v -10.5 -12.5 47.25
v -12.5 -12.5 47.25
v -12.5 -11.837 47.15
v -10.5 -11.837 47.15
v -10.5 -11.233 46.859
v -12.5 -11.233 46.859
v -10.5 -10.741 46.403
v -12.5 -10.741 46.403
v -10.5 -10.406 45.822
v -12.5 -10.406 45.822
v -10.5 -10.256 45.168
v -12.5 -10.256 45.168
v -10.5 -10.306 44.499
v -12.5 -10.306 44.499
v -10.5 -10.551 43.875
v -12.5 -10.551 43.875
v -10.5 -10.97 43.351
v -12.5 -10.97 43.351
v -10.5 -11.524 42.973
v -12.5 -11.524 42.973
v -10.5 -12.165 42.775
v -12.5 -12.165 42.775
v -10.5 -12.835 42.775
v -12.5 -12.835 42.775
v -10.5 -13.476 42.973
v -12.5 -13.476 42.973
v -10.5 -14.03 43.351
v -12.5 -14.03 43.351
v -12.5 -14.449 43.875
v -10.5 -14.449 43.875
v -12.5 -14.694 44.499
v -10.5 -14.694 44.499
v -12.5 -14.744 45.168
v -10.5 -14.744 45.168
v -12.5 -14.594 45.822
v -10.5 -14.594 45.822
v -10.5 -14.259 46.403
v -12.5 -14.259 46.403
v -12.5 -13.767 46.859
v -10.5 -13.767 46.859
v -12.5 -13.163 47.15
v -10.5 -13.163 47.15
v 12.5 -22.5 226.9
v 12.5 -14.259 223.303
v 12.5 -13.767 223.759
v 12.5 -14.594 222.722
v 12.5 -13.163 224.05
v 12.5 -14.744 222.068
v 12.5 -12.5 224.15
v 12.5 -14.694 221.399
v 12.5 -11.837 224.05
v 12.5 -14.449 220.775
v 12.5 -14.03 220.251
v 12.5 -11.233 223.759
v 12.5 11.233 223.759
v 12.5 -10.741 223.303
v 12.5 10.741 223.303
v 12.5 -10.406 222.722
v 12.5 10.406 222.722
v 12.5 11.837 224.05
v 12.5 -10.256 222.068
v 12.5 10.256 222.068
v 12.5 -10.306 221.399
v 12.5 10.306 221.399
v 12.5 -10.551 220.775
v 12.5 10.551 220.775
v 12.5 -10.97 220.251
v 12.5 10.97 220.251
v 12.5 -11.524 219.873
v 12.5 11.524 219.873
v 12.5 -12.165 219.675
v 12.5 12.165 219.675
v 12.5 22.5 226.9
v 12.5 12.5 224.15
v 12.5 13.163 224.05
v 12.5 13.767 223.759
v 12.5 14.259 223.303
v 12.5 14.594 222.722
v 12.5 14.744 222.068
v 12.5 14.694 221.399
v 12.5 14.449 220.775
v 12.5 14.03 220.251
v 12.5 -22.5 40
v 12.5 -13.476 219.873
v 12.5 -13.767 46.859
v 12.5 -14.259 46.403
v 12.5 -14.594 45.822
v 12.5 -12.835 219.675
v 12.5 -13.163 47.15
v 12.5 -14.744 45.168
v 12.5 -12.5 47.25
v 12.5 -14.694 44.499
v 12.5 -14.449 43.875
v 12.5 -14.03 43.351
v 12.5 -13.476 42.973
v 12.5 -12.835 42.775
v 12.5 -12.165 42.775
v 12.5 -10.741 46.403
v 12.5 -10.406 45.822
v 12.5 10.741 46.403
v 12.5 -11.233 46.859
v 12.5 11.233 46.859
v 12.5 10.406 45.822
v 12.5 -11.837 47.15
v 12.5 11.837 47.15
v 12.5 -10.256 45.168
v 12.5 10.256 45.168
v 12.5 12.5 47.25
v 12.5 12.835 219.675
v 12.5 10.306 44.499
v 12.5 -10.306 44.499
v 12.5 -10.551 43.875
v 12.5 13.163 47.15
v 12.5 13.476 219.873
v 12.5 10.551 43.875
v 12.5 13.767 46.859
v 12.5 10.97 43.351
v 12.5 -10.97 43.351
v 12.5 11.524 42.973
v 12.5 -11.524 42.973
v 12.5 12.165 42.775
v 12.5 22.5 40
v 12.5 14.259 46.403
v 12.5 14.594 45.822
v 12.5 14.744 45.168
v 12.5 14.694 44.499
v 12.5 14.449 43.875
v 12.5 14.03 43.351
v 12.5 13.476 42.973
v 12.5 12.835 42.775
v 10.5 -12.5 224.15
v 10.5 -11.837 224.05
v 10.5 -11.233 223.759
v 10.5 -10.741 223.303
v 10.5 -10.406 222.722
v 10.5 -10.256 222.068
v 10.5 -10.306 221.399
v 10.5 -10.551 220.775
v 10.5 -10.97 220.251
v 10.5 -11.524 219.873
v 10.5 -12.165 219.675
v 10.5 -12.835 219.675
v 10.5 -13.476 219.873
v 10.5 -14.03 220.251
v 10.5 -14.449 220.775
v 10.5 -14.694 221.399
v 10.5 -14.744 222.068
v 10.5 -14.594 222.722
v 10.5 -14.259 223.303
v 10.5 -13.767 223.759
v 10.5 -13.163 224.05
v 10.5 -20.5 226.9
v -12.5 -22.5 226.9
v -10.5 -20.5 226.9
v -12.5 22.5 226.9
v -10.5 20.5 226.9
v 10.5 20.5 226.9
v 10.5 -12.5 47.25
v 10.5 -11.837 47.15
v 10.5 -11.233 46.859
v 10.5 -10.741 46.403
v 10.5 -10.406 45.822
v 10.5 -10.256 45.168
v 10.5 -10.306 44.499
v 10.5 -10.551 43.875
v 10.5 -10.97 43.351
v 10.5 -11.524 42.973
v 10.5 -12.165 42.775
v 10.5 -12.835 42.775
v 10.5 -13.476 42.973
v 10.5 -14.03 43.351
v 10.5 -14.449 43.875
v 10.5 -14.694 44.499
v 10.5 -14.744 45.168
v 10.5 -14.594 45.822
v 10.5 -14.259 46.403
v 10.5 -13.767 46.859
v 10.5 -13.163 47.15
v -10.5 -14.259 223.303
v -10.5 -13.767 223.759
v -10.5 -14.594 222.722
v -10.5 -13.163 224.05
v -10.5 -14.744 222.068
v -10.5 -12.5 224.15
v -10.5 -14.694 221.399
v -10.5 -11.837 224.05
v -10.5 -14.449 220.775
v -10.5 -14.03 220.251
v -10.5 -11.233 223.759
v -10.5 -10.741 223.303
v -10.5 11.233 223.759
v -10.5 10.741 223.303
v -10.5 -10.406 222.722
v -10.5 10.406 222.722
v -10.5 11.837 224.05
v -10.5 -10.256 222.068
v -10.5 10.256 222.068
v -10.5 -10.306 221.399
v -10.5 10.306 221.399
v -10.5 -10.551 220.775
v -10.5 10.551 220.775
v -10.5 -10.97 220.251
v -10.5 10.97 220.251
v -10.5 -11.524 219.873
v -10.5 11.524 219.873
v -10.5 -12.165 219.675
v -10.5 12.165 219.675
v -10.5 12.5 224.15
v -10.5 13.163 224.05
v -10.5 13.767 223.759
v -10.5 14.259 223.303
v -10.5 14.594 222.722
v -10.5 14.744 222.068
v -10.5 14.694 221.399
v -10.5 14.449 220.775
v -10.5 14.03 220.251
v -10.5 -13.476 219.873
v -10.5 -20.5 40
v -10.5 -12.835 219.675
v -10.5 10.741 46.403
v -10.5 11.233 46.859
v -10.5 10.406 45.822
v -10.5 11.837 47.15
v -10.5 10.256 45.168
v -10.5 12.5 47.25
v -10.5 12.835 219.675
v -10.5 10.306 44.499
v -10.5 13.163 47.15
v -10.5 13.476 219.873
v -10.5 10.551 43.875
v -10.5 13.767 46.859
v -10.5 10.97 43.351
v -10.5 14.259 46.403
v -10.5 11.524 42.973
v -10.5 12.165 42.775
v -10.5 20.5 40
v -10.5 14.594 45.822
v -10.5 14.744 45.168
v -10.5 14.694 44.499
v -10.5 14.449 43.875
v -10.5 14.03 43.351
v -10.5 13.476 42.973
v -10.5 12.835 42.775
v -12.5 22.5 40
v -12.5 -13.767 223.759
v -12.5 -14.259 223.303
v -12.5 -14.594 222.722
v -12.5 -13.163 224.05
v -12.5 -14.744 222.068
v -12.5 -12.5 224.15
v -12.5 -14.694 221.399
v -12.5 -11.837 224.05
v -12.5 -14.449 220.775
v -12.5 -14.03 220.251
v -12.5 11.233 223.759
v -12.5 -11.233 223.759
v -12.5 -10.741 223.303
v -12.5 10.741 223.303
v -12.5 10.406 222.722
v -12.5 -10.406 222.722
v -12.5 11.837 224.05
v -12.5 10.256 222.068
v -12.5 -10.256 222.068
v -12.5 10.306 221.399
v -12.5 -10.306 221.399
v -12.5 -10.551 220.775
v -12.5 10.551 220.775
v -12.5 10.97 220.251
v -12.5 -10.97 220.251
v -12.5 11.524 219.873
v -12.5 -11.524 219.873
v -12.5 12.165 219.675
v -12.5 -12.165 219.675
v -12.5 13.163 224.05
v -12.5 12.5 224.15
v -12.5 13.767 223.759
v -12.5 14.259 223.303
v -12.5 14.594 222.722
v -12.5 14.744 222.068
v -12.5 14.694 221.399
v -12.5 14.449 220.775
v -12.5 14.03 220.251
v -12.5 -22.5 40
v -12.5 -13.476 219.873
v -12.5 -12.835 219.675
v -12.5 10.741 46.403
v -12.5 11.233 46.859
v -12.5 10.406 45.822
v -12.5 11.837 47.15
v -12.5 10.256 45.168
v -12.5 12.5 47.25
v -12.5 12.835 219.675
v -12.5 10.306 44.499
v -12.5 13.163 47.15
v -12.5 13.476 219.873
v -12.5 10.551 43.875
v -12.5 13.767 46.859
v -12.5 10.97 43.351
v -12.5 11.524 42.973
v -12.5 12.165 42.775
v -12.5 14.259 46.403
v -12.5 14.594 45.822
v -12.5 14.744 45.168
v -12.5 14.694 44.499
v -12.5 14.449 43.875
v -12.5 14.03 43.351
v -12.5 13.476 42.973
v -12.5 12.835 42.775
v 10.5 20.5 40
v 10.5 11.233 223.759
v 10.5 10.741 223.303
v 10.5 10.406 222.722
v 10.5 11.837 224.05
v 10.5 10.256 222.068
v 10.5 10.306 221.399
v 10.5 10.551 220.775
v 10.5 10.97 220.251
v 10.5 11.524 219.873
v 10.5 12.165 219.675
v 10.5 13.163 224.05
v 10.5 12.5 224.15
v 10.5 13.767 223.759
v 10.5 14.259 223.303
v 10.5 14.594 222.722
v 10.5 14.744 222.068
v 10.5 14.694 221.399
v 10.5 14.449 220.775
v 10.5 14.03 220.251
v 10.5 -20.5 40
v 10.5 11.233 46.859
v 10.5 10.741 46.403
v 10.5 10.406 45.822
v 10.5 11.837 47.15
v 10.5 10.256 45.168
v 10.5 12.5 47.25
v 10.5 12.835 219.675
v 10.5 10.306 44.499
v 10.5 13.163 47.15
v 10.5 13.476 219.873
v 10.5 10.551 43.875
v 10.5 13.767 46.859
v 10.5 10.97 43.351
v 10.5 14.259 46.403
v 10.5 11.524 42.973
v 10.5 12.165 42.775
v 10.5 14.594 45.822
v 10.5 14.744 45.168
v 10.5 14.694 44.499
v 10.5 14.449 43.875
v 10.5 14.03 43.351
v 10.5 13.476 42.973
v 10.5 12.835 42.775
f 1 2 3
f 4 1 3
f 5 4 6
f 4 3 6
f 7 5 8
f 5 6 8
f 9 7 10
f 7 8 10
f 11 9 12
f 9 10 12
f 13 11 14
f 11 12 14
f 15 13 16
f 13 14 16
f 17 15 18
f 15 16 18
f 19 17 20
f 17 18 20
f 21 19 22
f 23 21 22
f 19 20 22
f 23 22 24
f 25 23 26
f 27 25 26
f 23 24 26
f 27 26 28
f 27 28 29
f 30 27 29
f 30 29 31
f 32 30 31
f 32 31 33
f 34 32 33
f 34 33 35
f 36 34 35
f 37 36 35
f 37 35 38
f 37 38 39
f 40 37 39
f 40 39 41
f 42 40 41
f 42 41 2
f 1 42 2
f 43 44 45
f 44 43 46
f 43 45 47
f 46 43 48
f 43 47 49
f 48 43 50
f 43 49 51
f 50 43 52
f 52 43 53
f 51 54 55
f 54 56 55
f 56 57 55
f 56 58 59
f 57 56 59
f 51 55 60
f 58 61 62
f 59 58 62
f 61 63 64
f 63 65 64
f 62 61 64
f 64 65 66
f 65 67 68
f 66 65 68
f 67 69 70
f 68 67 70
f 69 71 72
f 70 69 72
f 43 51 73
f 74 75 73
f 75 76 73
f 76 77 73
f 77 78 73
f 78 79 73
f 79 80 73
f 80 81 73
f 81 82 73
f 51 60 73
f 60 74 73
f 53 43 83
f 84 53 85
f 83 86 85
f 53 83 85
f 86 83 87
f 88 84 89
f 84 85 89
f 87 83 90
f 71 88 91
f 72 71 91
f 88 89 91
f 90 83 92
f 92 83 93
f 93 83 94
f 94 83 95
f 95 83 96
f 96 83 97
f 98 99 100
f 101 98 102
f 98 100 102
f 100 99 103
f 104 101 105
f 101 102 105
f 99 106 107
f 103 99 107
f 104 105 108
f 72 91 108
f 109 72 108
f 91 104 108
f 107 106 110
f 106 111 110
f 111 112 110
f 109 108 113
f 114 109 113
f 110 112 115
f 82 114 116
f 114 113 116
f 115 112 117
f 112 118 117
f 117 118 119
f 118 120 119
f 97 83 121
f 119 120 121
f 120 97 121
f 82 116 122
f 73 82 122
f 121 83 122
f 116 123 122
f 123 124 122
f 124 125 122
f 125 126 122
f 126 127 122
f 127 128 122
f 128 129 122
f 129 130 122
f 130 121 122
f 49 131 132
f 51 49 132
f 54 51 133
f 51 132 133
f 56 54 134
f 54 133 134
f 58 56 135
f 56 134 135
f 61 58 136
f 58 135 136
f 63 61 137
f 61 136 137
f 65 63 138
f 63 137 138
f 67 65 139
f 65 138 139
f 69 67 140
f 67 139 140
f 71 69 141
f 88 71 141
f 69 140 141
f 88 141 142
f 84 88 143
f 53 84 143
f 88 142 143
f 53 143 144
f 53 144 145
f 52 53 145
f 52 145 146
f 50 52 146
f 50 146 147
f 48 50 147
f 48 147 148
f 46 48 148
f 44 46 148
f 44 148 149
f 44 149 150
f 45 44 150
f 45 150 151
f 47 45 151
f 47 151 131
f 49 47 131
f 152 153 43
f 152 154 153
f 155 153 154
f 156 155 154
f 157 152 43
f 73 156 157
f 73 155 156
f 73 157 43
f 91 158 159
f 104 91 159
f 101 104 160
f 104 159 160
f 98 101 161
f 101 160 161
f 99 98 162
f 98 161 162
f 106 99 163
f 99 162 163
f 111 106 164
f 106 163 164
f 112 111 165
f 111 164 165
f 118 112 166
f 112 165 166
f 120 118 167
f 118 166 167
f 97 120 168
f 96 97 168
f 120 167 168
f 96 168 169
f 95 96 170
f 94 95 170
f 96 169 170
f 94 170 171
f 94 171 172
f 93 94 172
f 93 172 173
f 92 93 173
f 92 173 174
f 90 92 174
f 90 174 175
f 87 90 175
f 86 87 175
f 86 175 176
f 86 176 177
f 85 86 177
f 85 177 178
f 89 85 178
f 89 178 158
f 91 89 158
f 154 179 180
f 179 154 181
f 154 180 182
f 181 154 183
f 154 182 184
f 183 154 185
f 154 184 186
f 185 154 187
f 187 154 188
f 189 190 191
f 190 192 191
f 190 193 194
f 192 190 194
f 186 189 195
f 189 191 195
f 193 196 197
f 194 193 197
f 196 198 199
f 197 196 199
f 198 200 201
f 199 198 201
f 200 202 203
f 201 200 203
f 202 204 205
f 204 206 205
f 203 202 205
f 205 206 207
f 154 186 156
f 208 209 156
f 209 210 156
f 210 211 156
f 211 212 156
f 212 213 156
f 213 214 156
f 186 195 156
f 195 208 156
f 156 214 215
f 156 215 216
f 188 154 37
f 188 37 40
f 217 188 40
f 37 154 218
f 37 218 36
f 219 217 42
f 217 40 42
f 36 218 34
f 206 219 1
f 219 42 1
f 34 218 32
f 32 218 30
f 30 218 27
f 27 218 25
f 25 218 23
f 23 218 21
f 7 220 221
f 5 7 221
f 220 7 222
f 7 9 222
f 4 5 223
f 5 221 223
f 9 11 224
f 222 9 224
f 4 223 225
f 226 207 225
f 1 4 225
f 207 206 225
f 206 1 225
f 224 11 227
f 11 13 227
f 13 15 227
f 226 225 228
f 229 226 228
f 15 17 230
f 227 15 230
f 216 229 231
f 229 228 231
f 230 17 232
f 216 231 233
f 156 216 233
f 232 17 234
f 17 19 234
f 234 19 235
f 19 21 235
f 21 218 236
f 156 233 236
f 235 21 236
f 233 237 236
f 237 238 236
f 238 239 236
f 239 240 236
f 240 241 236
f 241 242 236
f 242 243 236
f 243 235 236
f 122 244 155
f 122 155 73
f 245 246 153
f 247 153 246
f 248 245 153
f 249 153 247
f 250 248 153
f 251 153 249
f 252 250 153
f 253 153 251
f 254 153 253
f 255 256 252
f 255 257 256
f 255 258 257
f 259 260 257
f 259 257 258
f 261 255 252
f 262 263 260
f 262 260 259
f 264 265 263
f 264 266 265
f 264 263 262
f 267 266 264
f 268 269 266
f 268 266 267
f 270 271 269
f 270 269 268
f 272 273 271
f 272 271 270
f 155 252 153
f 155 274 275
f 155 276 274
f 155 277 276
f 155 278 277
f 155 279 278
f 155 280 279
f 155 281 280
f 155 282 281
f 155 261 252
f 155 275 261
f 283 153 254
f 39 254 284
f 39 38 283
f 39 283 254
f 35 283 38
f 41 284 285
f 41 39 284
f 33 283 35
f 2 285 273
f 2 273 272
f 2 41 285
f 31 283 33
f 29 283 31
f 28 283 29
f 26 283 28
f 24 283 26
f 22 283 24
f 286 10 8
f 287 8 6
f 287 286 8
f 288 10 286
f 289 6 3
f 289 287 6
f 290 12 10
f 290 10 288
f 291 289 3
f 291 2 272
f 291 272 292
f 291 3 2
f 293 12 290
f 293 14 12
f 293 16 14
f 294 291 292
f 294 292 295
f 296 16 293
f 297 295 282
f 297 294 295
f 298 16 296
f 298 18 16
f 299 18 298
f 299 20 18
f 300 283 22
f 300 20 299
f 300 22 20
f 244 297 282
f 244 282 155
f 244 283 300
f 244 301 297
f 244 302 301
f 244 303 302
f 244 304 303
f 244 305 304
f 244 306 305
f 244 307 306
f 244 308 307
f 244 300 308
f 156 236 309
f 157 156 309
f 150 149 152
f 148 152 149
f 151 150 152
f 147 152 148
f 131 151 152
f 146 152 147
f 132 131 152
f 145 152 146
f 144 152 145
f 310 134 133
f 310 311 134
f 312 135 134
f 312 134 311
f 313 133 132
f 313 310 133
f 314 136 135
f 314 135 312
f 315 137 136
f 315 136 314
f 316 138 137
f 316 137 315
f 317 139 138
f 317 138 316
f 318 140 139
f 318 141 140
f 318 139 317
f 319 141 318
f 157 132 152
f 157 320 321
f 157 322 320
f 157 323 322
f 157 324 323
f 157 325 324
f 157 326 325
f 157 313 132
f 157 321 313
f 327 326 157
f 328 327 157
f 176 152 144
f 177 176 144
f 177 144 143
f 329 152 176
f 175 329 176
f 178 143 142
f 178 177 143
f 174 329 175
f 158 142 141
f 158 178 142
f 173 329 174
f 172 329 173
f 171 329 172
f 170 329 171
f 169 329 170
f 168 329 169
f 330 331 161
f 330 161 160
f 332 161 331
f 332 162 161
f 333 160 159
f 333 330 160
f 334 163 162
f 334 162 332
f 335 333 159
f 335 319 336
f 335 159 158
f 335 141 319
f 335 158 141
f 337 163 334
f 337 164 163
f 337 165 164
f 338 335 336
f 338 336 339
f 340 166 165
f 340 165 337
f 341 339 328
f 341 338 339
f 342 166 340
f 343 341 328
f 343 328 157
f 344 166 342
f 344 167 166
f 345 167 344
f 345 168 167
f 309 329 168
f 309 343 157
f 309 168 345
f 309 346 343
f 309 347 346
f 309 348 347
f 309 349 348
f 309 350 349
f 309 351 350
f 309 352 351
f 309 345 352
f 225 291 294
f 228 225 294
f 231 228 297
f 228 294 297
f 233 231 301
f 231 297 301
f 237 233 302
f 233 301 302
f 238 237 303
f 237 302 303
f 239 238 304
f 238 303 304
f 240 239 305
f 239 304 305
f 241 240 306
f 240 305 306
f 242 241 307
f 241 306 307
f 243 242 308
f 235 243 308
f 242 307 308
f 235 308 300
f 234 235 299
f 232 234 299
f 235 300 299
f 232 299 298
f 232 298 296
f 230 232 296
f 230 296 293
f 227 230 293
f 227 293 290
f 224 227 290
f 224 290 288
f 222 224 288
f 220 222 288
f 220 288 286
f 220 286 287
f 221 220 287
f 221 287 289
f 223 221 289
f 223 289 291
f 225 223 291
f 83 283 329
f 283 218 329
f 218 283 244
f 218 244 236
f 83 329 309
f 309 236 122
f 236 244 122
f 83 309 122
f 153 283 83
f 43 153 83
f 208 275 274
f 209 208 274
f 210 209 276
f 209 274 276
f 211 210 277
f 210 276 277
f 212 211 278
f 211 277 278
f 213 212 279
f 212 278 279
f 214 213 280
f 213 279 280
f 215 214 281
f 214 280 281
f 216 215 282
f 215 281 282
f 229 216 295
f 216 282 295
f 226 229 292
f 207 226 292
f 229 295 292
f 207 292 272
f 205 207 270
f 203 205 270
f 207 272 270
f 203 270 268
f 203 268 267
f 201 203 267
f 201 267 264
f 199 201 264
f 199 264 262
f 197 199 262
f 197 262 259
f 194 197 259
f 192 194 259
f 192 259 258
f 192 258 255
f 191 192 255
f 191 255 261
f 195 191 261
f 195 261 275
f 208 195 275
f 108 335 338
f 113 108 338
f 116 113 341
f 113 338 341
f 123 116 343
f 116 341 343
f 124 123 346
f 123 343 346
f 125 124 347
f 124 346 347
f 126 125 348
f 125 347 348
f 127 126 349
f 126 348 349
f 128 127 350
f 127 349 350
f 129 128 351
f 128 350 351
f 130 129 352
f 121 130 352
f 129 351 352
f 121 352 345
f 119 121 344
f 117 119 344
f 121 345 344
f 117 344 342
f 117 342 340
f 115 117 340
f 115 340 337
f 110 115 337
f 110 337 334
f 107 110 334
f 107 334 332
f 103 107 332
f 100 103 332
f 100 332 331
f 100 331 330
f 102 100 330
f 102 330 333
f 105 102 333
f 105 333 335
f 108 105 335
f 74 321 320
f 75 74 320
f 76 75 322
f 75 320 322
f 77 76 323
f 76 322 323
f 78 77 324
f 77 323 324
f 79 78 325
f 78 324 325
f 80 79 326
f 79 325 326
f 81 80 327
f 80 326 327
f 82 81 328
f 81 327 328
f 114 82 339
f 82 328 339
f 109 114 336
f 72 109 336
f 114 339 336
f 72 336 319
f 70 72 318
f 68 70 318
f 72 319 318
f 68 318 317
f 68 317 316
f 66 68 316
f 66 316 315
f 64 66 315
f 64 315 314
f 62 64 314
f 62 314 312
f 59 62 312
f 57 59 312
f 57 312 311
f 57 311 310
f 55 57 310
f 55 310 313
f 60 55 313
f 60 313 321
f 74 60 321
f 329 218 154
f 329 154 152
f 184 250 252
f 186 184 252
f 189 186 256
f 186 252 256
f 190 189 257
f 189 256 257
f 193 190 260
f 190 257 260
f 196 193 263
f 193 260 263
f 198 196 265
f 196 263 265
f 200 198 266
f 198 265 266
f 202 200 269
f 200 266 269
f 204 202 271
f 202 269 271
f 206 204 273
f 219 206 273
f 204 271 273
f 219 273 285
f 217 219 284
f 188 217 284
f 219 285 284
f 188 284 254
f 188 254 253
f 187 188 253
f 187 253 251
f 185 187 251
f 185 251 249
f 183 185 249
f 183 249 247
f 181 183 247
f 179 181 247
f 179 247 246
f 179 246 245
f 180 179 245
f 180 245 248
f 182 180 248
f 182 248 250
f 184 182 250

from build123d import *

# Parameters (mm, degrees)
SKETCH1_W            = 25
SKETCH1_H            = 45
SKETCH1_W_2          = 21
SKETCH1_H_2          = 41
BOSS_EXTRUDE1_DEPTH  = 186.9
M4_CLEARANCE_HOLE1_D = 4.5


with BuildPart() as part:
    # Sketch1 → Boss-Extrude1 (new body)
    with BuildSketch(Plane.XY.offset(40)):
        Rectangle(SKETCH1_W, SKETCH1_H)
        Rectangle(SKETCH1_W_2, SKETCH1_H_2, mode=Mode.SUBTRACT)
    extrude(amount=BOSS_EXTRUDE1_DEPTH)

    # M4 Clearance Hole1 (through all)
    with Locations(Plane(origin=(12.5, 0, 0), x_dir=(0, 0, -1), z_dir=(1, 0, 0))):
        with Locations((-45, -12.5), (-45, 12.5), (-221.9, 12.5), (-221.9, -12.5)):
            Hole(M4_CLEARANCE_HOLE1_D / 2)


solid = part.part
